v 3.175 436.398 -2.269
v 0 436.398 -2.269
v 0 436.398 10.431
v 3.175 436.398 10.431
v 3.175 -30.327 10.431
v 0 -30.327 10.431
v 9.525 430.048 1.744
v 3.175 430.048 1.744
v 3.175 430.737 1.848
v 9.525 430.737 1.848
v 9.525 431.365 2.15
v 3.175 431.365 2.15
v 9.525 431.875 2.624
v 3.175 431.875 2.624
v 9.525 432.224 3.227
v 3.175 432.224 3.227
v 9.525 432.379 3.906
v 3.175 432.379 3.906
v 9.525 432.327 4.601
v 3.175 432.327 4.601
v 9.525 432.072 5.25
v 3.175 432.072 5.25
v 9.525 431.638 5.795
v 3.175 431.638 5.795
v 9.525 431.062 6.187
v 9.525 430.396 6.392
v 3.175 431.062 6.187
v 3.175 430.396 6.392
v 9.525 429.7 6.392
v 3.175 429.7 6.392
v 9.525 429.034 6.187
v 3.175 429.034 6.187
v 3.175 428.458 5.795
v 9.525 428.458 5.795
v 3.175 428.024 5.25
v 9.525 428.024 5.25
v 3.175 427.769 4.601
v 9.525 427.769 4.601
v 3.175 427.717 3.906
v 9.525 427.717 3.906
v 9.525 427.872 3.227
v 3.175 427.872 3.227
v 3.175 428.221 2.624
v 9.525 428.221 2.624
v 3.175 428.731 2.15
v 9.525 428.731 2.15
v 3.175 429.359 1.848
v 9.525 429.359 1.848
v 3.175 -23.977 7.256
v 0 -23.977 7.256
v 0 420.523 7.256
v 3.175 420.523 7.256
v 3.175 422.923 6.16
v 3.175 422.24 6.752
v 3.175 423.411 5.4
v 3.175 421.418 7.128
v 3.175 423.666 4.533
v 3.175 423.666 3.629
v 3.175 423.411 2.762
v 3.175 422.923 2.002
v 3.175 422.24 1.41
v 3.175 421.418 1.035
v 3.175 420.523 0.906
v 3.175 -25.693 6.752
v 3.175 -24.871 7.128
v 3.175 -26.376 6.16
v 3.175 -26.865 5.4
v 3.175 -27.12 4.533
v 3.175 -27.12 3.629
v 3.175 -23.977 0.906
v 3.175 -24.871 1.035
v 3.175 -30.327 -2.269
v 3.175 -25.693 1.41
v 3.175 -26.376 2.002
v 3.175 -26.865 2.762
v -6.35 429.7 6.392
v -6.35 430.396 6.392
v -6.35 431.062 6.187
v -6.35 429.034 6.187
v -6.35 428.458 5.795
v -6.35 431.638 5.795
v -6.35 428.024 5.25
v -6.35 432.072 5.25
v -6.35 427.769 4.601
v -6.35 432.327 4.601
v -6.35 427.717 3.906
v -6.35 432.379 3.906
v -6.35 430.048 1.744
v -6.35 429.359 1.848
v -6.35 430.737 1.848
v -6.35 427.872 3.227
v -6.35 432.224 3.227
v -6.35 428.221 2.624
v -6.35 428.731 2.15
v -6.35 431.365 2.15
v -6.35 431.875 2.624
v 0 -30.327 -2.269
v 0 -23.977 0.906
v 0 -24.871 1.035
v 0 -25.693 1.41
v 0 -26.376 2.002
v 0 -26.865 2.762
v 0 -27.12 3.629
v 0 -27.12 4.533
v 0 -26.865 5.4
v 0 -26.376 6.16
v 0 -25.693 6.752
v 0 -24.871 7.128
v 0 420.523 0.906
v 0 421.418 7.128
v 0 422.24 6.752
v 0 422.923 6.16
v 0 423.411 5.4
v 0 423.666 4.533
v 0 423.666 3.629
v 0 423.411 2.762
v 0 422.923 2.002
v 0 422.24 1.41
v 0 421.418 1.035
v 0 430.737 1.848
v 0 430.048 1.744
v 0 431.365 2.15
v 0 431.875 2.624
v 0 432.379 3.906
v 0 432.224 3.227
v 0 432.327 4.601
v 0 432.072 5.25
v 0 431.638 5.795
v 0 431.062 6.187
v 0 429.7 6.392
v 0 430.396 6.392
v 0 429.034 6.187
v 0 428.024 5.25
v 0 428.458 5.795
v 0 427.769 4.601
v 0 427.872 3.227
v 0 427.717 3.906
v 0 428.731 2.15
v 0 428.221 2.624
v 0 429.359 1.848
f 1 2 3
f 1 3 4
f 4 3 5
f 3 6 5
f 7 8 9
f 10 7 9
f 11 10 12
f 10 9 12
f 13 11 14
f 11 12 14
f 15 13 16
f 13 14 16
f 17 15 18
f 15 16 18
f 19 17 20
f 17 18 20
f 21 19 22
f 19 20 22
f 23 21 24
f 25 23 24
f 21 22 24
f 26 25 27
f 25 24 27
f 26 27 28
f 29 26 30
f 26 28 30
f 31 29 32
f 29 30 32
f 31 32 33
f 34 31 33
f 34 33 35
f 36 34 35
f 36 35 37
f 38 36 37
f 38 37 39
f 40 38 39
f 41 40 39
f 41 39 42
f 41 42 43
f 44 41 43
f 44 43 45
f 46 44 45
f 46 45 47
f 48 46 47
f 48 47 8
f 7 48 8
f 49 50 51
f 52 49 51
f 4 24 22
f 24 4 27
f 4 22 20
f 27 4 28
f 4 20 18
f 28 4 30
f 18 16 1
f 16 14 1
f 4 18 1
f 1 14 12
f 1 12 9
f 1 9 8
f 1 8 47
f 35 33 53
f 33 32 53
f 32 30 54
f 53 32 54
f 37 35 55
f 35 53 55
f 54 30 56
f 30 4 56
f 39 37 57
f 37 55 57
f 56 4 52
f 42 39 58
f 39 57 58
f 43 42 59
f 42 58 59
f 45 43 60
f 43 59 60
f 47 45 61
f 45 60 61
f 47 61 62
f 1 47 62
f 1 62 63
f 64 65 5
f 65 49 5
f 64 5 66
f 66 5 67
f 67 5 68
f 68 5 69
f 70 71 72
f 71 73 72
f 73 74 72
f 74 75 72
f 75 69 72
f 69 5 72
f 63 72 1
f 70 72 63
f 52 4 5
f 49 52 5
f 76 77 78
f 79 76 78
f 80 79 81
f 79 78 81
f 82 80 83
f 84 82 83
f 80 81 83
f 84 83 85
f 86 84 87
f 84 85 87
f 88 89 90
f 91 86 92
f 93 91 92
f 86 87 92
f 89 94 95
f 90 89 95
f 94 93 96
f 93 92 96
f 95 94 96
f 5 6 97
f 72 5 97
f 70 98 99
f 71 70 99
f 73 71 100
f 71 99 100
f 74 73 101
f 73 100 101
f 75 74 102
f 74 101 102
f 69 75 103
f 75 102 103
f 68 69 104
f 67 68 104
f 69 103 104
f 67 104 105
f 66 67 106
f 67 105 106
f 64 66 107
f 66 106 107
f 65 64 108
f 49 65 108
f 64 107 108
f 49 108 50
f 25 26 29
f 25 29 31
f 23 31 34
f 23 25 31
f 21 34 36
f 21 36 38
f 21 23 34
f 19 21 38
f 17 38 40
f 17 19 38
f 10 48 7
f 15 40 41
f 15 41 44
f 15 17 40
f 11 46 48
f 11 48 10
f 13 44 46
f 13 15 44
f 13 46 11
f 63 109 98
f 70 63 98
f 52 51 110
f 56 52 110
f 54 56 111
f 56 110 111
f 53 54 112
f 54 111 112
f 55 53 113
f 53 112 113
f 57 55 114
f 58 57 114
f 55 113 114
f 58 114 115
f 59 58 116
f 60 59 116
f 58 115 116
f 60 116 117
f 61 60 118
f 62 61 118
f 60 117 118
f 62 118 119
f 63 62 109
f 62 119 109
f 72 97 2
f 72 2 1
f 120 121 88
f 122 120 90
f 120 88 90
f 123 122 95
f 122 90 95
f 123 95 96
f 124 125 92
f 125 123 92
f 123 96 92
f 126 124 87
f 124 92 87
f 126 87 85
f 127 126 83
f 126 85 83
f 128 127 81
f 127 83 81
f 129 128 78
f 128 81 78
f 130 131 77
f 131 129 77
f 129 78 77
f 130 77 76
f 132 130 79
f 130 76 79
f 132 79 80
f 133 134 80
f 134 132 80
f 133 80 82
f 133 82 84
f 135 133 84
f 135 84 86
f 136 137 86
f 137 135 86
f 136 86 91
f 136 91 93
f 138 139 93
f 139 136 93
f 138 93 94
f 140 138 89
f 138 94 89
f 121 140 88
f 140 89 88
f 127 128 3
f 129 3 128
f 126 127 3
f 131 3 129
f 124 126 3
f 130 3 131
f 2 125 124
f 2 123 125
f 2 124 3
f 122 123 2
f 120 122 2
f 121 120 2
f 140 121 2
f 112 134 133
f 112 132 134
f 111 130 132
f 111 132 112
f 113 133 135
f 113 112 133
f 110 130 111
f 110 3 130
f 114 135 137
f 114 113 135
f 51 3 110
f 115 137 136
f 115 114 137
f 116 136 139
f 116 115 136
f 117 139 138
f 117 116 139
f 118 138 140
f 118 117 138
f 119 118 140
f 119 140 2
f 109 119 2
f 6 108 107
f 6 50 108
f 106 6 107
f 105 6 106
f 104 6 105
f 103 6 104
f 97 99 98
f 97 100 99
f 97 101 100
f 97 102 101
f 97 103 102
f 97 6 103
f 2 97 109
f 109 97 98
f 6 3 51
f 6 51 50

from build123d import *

# Parameters (mm, degrees)
SKETCH1_W                = 12.7
SKETCH1_H                = 457.2
BOSS_EXTRUDE1_DEPTH      = 3.175
SKETCH2_W                = 3.175
SKETCH2_H                = 12.7
BOSS_EXTRUDE2_DEPTH      = 9.525
BOSS_EXTRUDE3_DEPTH      = 6.35
BOSS_EXTRUDE3_DEPTH_BACK = 9.525
SKETCH3_R                = 2.337311212


with BuildPart() as part:
    # Sketch1 → Boss-Extrude1 (new body)
    with BuildSketch(Plane(origin=(0, 0, 0), x_dir=(0, 0, -1), z_dir=(1, 0, 0))):
        with Locations((-4.081130849, 198.273055815)):
            Rectangle(SKETCH1_W, SKETCH1_H)
        with BuildLine():
            Line((-7.256130849, -23.976944185), (-7.256130849, 420.523055815))
            ThreePointArc((-7.256130849, 420.523055815), (-4.081130849, 423.698055815), (-0.906130849, 420.523055815))
            Line((-0.906130849, 420.523055815), (-0.906130849, -23.976944185))
            ThreePointArc((-0.906130849, -23.976944185), (-4.081130849, -27.151944185), (-7.256130849, -23.976944185))
        make_face(mode=Mode.SUBTRACT)
    extrude(amount=BOSS_EXTRUDE1_DEPTH)

    # Sketch2 → Boss-Extrude2 (add)
    with BuildSketch(Plane(origin=(0, 426.873055815, 0), x_dir=(1, 0, 0), z_dir=(0, 1, 0))):
        with Locations((1.5875, -4.081130849)):
            Rectangle(SKETCH2_W, SKETCH2_H)
    extrude(amount=BOSS_EXTRUDE2_DEPTH)

    # Sketch3 → Boss-Extrude3 (add, two sides: drawn at the far end of the back side and taken through both)
    with BuildSketch(Plane(origin=(3.175, 0, 0), x_dir=(0, 0, -1), z_dir=(1, 0, 0)).offset(-BOSS_EXTRUDE3_DEPTH_BACK)):
        with Locations((-4.081130849, 430.048055815)):
            Circle(SKETCH3_R)
    extrude(amount=BOSS_EXTRUDE3_DEPTH + BOSS_EXTRUDE3_DEPTH_BACK)


solid = part.part
